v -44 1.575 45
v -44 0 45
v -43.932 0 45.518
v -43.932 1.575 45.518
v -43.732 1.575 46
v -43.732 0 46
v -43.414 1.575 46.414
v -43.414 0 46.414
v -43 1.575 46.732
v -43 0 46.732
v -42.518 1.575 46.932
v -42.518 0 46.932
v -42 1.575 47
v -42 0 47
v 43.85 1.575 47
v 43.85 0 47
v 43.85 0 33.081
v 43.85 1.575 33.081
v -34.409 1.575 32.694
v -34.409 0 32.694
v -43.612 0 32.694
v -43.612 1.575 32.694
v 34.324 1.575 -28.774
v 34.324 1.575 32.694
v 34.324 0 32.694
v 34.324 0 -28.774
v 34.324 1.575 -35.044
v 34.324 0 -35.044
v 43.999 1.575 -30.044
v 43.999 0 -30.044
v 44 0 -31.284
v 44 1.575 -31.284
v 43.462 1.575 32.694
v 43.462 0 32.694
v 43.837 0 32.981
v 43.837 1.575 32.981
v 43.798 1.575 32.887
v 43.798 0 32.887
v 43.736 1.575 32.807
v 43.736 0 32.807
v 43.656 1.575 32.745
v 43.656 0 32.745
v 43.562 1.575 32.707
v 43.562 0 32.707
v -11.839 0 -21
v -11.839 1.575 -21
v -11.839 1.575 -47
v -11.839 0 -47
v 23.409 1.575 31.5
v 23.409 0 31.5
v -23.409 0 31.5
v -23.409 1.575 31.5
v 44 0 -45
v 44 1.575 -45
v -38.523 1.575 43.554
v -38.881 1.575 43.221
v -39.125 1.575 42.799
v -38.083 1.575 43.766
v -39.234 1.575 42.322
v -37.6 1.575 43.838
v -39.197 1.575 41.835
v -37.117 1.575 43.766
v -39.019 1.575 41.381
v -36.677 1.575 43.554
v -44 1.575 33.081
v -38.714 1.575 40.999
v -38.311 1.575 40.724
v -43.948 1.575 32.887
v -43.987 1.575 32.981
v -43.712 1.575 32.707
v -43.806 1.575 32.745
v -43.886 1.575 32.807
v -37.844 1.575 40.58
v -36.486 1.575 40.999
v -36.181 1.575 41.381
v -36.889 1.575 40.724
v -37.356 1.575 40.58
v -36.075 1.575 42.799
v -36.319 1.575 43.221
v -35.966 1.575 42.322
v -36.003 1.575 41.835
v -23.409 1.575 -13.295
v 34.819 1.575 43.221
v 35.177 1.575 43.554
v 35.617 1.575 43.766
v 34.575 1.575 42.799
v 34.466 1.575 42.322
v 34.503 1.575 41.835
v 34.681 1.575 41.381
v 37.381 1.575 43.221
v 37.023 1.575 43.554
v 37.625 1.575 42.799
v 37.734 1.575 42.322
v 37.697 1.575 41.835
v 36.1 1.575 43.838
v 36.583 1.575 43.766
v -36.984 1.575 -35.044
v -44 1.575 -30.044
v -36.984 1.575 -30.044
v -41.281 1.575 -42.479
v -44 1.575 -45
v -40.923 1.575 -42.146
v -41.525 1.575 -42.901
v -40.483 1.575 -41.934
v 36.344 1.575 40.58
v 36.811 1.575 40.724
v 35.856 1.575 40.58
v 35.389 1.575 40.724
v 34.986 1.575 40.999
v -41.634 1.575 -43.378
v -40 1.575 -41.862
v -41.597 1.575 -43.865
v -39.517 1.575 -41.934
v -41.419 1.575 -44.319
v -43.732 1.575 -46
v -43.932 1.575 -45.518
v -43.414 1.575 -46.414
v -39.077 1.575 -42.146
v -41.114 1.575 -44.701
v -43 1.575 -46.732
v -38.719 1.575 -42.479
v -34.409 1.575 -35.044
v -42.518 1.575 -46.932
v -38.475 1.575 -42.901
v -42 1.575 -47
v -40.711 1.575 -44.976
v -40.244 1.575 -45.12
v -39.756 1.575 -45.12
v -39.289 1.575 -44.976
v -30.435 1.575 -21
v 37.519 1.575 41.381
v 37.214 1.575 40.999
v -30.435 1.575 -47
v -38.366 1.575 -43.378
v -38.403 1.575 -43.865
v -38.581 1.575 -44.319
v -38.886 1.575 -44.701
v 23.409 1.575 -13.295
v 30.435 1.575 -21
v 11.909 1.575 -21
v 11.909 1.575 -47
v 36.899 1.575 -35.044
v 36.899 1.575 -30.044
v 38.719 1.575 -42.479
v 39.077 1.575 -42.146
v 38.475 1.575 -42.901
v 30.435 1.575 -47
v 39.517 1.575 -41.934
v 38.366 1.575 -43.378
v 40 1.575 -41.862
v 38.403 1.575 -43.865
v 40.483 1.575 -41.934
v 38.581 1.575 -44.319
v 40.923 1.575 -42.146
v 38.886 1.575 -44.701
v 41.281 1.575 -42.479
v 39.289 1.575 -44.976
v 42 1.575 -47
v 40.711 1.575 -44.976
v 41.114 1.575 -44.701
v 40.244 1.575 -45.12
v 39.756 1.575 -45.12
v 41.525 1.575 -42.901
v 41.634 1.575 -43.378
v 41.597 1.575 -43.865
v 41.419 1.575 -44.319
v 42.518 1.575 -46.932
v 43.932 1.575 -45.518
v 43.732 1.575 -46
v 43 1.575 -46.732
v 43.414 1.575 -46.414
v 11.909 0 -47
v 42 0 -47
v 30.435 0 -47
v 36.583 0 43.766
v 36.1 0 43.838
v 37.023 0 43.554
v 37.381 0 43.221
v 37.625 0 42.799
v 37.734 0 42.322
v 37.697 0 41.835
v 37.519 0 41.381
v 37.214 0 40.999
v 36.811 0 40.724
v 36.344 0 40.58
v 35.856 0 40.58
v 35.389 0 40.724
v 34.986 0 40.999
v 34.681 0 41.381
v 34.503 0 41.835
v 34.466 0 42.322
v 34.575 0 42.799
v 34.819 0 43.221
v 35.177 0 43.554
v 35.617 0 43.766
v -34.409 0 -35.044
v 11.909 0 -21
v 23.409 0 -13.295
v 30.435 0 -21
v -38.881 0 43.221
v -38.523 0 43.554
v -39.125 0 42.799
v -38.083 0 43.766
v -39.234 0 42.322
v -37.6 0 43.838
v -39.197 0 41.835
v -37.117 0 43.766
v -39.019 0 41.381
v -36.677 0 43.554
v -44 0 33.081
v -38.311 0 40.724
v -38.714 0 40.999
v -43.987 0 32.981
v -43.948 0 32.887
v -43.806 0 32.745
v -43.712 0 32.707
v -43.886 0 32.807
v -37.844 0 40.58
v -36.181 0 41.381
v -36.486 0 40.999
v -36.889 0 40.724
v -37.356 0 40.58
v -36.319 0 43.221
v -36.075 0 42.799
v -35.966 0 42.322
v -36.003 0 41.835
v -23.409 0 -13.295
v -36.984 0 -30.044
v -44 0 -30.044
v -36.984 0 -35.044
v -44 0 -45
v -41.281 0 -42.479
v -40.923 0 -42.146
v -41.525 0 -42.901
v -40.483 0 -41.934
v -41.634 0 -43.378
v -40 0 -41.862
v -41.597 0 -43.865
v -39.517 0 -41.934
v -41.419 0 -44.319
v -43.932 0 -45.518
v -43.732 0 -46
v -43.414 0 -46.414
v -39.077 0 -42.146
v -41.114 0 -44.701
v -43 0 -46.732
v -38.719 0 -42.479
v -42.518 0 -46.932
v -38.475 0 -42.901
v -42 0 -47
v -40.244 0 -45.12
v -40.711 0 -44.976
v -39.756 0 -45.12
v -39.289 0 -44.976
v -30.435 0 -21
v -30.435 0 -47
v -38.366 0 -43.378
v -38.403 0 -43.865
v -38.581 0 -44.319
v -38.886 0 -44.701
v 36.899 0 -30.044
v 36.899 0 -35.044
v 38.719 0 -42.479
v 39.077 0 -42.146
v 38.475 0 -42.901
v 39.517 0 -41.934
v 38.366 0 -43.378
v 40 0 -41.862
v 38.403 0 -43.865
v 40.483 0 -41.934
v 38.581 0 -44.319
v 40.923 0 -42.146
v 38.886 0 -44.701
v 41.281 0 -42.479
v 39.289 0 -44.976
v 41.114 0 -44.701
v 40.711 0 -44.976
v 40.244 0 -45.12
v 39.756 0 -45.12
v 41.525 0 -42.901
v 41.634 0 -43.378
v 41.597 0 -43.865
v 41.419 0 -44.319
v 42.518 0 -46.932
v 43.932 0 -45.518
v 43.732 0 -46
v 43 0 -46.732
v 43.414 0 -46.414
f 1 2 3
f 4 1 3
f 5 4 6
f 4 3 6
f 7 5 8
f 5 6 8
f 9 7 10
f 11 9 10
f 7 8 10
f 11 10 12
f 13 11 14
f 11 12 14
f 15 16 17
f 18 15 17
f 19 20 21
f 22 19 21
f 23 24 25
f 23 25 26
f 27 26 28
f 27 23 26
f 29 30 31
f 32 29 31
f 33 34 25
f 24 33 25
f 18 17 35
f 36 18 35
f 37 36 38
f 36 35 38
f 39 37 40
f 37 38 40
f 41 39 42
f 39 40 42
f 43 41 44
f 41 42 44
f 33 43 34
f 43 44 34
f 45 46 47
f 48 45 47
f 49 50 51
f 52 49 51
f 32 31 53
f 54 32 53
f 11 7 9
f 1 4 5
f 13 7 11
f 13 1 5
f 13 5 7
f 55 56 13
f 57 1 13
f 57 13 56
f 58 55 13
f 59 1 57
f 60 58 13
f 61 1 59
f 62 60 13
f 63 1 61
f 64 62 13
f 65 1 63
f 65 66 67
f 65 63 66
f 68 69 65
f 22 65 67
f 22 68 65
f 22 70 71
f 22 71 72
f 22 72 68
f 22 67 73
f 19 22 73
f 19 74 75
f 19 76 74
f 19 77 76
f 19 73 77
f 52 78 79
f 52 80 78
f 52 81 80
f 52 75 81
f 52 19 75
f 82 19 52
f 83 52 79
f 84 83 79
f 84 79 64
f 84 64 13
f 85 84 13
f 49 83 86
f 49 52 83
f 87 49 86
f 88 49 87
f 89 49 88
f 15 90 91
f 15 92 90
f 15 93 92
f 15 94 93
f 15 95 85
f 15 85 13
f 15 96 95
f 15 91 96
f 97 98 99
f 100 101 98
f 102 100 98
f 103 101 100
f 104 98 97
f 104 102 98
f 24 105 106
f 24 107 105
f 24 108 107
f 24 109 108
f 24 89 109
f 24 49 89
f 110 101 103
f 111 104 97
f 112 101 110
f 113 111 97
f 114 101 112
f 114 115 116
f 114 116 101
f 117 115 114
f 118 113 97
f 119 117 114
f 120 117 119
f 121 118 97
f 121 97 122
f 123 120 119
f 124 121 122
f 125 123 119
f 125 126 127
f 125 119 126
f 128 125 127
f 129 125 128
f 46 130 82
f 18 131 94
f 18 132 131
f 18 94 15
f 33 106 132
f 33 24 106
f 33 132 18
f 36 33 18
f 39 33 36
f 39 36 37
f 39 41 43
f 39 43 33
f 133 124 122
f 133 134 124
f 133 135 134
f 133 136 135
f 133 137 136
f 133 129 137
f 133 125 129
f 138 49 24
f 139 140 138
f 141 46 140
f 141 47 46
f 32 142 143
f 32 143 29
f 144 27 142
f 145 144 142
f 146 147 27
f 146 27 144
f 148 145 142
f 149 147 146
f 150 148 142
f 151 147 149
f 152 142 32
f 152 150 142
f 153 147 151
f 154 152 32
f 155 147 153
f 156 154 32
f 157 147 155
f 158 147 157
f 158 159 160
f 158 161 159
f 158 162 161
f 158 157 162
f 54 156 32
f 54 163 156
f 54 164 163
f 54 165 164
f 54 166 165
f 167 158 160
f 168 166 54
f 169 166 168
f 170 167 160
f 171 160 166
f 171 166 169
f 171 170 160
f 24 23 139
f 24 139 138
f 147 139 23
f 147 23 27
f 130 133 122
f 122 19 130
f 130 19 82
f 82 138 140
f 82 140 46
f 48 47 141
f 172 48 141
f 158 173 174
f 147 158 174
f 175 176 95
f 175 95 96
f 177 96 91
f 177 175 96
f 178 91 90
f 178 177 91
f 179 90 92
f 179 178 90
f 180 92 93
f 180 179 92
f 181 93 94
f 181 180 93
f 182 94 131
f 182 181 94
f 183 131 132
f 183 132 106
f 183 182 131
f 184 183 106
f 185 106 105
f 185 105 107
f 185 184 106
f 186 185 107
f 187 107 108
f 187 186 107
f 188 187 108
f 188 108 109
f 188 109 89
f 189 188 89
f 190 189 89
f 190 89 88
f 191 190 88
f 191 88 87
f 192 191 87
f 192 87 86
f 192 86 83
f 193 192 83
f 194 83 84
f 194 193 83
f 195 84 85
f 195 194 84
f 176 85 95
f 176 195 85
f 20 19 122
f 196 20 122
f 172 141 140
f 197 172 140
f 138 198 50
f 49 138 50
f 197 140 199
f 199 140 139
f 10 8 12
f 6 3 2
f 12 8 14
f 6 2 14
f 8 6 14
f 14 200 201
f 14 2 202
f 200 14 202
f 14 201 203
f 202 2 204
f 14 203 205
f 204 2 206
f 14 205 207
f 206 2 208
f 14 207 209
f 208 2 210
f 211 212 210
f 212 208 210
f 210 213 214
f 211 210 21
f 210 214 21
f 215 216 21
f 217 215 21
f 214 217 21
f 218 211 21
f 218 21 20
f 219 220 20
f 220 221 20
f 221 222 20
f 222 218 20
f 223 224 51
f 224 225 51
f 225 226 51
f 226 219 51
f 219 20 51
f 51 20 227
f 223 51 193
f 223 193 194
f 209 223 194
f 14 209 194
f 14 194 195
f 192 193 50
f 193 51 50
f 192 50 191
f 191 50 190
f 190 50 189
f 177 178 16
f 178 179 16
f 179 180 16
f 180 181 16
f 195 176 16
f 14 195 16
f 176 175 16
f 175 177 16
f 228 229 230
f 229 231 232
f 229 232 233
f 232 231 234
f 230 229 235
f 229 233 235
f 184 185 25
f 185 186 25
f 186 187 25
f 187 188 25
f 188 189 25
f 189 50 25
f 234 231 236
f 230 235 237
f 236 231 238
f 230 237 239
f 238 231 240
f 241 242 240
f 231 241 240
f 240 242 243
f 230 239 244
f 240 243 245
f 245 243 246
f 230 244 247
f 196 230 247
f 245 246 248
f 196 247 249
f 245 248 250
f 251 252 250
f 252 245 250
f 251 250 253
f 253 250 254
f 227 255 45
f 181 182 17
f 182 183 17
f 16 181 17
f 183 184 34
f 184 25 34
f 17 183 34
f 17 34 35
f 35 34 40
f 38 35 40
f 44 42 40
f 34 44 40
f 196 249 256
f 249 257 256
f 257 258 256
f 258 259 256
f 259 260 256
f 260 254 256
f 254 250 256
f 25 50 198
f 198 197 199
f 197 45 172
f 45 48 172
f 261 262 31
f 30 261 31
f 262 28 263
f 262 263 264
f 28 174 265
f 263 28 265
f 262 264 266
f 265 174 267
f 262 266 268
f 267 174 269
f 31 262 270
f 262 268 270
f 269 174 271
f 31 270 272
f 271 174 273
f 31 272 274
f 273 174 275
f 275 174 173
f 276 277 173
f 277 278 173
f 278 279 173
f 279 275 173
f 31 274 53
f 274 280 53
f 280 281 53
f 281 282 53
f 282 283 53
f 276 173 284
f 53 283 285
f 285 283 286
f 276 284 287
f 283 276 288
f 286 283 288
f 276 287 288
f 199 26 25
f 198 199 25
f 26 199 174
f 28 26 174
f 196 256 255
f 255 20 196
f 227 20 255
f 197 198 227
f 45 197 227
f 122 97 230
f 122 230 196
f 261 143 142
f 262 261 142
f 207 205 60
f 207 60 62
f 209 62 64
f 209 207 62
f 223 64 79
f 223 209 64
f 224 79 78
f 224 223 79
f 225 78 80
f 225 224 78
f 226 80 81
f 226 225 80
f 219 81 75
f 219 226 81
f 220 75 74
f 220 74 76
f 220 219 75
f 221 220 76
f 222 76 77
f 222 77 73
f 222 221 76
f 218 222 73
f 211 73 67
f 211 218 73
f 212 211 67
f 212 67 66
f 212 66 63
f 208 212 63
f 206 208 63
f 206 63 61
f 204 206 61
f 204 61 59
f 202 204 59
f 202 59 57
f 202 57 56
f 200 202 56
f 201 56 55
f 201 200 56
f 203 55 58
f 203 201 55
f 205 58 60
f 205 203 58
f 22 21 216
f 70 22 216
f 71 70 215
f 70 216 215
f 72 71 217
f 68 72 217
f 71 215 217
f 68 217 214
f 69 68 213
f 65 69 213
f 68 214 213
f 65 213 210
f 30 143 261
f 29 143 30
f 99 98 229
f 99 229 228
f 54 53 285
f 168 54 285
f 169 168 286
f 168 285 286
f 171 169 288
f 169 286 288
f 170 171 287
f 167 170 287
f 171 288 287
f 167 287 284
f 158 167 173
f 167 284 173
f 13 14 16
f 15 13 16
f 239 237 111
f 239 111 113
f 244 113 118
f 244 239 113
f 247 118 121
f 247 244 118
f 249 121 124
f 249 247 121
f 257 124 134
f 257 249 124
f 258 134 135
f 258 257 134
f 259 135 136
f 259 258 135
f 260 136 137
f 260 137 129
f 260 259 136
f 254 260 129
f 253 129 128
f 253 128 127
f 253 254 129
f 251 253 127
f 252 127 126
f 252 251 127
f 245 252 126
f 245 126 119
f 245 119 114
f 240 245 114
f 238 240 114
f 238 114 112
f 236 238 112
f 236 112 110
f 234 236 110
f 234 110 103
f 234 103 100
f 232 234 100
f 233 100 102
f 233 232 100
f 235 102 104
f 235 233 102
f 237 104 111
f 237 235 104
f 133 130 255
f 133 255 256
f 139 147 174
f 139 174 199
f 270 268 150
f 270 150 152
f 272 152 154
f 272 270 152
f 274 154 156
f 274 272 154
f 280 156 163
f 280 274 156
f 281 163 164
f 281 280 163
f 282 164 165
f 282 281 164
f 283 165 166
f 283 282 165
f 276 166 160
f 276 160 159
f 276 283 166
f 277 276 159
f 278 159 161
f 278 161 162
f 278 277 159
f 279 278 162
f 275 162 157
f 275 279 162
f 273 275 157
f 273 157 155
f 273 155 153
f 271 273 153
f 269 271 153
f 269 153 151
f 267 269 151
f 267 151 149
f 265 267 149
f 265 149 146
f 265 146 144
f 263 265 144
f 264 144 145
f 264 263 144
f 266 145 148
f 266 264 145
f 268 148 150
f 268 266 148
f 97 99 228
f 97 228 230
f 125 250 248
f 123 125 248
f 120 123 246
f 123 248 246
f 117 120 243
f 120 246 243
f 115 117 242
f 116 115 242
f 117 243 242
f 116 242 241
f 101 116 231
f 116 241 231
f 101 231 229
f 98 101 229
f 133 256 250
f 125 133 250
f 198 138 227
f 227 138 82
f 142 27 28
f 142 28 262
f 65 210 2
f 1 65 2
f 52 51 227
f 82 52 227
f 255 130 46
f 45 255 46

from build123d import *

# Parameters (mm, degrees)
SKETCH1_R                        = 1.6383
BOSS_EXTRUDE1_DEPTH              = 1.575
CUT_EXTRUDE1_DEPTH               = 2.54
CUTOUTS_FOR_THRUSTER_HEADS_DEPTH = 1.575
NOTCH_FOR_BPR_TOP_VIEW_W         = 2.575
NOTCH_FOR_BPR_TOP_VIEW_H         = 6.27
CUT_EXTRUDE11_DEPTH              = 10
NOTCH_FOR_BPL_TOP_VIEW_W         = 2.575
NOTCH_FOR_BPL_TOP_VIEW_H         = 6.27
CUT_EXTRUDE12_DEPTH              = 65.400936523
SKETCH22_W                       = 1.501374709
SKETCH22_H                       = 61.468
SKETCH22_W_2                     = 1.585
BOSS_EXTRUDE2_DEPTH              = 1.575
SKETCH23_W                       = 7.1002401
SKETCH23_H                       = 1.27
SKETCH23_W_2                     = 7.016
CUT_EXTRUDE13_DEPTH              = 65.400936523


with BuildPart() as part:
    # Sketch1 → Boss-Extrude1 (new body)
    with BuildSketch(Plane(origin=(0, 0, 0), x_dir=(1, 0, 0), z_dir=(0, 1, 0))):
        with BuildLine():
            Line((-44, 45), (-44, 29.162404323))
            ThreePointArc((-44, 29.162404323), (-43.886381258, 28.888104416), (-43.612081351, 28.774485674))
            Line((-43.612081351, 28.774485674), (-33.211918649, 28.774485674))
            ThreePointArc((-33.211918649, 28.774485674), (-32.937618742, 28.660866933), (-32.824, 28.386567026))
            Line((-32.824, 28.386567026), (-32.824, -32.305595677))
            ThreePointArc((-32.824, -32.305595677), (-32.937618742, -32.579895584), (-33.211918649, -32.693514326))
            Line((-33.211918649, -32.693514326), (-36.100000052, -32.693514326))
            Line((-36.100000052, -32.693514326), (-43.612081299, -32.693514326))
            ThreePointArc((-43.612081299, -32.693514326), (-43.886381206, -32.807133067), (-43.999999948, -33.081432974))
            Line((-43.999999948, -33.081432974), (-43.999999948, -38.977))
            Line((-43.999999948, -38.977), (-43.999999948, -45))
            ThreePointArc((-43.999999948, -45), (-43.41421351, -46.414213562), (-41.999999948, -47))
            Line((-41.999999948, -47), (42.705916546, -47))
            Line((42.705916546, -47), (43.849731117, -47))
            Line((43.849731117, -47), (43.849731117, -38.27))
            Line((43.849731117, -38.27), (43.849731117, -33.081432974))
            ThreePointArc((43.849731117, -33.081432974), (43.736112376, -32.807133067), (43.461812469, -32.693514326))
            Line((43.461812469, -32.693514326), (36.098785193, -32.693514326))
            Line((36.098785193, -32.693514326), (33.824, -32.693514326))
            Line((33.824, -32.693514326), (32.822785141, -32.693514326))
            Line((32.822785141, -32.693514326), (32.822785141, -30.469351623))
            Line((32.822785141, -30.469351623), (32.822785141, 27.774485674))
            ThreePointArc((32.822785141, 27.774485674), (33.11567836, 28.481592456), (33.822785141, 28.774485674))
            Line((33.822785141, 28.774485674), (43.611054239, 28.774485674))
            ThreePointArc((43.611054239, 28.774485674), (43.885287743, 28.88803803), (43.998972842, 29.162216531))
            Line((43.998972842, 29.162216531), (44, 31.284))
            Line((44, 31.284), (44, 45))
            ThreePointArc((44, 45), (43.414213562, 46.414213562), (42, 47))
            Line((42, 47), (-42, 47))
            ThreePointArc((-42, 47), (-43.414213562, 46.414213562), (-44, 45))
        make_face()
        with Locations(Location((40, 43.5, 0), (0, 0, 270))):
            Circle(SKETCH1_R, mode=Mode.SUBTRACT)
        with Locations(Location((-40, 43.5, 0), (0, 0, 270))):
            Circle(SKETCH1_R, mode=Mode.SUBTRACT)
        with Locations(Location((-37.599999948, -42.2, 0), (0, 0, 270))):
            Circle(SKETCH1_R, mode=Mode.SUBTRACT)
        with Locations(Location((36.100000052, -42.2, 0), (0, 0, 270))):
            Circle(SKETCH1_R, mode=Mode.SUBTRACT)
        Polygon((23.409, -31.5), (-23.409, -31.5), (-23.409, 13.29544), (-12.909, 13.29544), (-12.909, 25.99544), (12.909, 25.99544), (12.909, 13.29544), (23.409, 13.29544), align=None, mode=Mode.SUBTRACT)
    extrude(amount=BOSS_EXTRUDE1_DEPTH)

    # Sketch2 → Cut-Extrude1 (cut)
    with BuildSketch(Plane(origin=(0, 1.575, 0), x_dir=(1, 0, 0), z_dir=(0, 1, 0))):
        Polygon((-12.909, 19.06), (-30.435, 19.06), (-30.435, 47), (30.435, 47), (30.435, 19.06), (12.909, 19.06), (12.909, 25.99544), (-12.909, 25.99544), align=None)
    extrude(amount=-CUT_EXTRUDE1_DEPTH, mode=Mode.SUBTRACT)

    # Sketch16 → Cutouts for Thruster Heads (add)
    with BuildSketch(Plane(origin=(0, 1.575, 0), x_dir=(1, 0, 0), z_dir=(0, 1, 0))):
        Polygon((12.909, 19.06), (12.909, 13.29544), (-12.909, 13.29544), (-12.909, 19.06), (-30.435, 19.06), (-30.435, 21), (-11.838888217, 21), (-11.838888217, 47), (11.909, 47), (11.909, 21), (30.435, 21), (30.435, 19.06), align=None)
    extrude(amount=-CUTOUTS_FOR_THRUSTER_HEADS_DEPTH)

    # Notch for BPR (TOP VIEW) → Cut-Extrude11 (cut)
    with BuildSketch(Plane(origin=(0, 1.575, 0), x_dir=(1, 0, 0), z_dir=(0, 1, 0))):
        with Locations((-35.6965, 31.909485674)):
            Rectangle(NOTCH_FOR_BPR_TOP_VIEW_W, NOTCH_FOR_BPR_TOP_VIEW_H)
    extrude(amount=-CUT_EXTRUDE11_DEPTH, mode=Mode.SUBTRACT)

    # Notch for BPL (TOP VIEW) → Cut-Extrude12 (cut, through all)
    with BuildSketch(Plane(origin=(0, 1.575, 0), x_dir=(1, 0, 0), z_dir=(0, 1, 0))):
        with Locations((35.61165985, 31.909485674)):
            Rectangle(NOTCH_FOR_BPL_TOP_VIEW_W, NOTCH_FOR_BPL_TOP_VIEW_H)
    extrude(amount=-CUT_EXTRUDE12_DEPTH, mode=Mode.SUBTRACT)

    # Sketch22 → Boss-Extrude2 (add)
    with BuildSketch(Plane(origin=(0, 1.575, 0), x_dir=(1, 0, 0), z_dir=(0, 1, 0))):
        with Locations((33.573472495, -1.959514326)):
            Rectangle(SKETCH22_W, SKETCH22_H)
        with Locations((-33.6165, -1.959514326)):
            Rectangle(SKETCH22_W_2, SKETCH22_H)
    extrude(amount=-BOSS_EXTRUDE2_DEPTH)

    # Sketch23 → Cut-Extrude13 (cut, through all)
    with BuildSketch(Plane(origin=(0, 1.575, 0), x_dir=(1, 0, 0), z_dir=(0, 1, 0))):
        with Locations((40.4492799, 29.409485674)):
            Rectangle(SKETCH23_W, SKETCH23_H)
        with Locations((-40.492, 29.409485674)):
            Rectangle(SKETCH23_W_2, SKETCH23_H)
    extrude(amount=-CUT_EXTRUDE13_DEPTH, mode=Mode.SUBTRACT)


solid = part.part
